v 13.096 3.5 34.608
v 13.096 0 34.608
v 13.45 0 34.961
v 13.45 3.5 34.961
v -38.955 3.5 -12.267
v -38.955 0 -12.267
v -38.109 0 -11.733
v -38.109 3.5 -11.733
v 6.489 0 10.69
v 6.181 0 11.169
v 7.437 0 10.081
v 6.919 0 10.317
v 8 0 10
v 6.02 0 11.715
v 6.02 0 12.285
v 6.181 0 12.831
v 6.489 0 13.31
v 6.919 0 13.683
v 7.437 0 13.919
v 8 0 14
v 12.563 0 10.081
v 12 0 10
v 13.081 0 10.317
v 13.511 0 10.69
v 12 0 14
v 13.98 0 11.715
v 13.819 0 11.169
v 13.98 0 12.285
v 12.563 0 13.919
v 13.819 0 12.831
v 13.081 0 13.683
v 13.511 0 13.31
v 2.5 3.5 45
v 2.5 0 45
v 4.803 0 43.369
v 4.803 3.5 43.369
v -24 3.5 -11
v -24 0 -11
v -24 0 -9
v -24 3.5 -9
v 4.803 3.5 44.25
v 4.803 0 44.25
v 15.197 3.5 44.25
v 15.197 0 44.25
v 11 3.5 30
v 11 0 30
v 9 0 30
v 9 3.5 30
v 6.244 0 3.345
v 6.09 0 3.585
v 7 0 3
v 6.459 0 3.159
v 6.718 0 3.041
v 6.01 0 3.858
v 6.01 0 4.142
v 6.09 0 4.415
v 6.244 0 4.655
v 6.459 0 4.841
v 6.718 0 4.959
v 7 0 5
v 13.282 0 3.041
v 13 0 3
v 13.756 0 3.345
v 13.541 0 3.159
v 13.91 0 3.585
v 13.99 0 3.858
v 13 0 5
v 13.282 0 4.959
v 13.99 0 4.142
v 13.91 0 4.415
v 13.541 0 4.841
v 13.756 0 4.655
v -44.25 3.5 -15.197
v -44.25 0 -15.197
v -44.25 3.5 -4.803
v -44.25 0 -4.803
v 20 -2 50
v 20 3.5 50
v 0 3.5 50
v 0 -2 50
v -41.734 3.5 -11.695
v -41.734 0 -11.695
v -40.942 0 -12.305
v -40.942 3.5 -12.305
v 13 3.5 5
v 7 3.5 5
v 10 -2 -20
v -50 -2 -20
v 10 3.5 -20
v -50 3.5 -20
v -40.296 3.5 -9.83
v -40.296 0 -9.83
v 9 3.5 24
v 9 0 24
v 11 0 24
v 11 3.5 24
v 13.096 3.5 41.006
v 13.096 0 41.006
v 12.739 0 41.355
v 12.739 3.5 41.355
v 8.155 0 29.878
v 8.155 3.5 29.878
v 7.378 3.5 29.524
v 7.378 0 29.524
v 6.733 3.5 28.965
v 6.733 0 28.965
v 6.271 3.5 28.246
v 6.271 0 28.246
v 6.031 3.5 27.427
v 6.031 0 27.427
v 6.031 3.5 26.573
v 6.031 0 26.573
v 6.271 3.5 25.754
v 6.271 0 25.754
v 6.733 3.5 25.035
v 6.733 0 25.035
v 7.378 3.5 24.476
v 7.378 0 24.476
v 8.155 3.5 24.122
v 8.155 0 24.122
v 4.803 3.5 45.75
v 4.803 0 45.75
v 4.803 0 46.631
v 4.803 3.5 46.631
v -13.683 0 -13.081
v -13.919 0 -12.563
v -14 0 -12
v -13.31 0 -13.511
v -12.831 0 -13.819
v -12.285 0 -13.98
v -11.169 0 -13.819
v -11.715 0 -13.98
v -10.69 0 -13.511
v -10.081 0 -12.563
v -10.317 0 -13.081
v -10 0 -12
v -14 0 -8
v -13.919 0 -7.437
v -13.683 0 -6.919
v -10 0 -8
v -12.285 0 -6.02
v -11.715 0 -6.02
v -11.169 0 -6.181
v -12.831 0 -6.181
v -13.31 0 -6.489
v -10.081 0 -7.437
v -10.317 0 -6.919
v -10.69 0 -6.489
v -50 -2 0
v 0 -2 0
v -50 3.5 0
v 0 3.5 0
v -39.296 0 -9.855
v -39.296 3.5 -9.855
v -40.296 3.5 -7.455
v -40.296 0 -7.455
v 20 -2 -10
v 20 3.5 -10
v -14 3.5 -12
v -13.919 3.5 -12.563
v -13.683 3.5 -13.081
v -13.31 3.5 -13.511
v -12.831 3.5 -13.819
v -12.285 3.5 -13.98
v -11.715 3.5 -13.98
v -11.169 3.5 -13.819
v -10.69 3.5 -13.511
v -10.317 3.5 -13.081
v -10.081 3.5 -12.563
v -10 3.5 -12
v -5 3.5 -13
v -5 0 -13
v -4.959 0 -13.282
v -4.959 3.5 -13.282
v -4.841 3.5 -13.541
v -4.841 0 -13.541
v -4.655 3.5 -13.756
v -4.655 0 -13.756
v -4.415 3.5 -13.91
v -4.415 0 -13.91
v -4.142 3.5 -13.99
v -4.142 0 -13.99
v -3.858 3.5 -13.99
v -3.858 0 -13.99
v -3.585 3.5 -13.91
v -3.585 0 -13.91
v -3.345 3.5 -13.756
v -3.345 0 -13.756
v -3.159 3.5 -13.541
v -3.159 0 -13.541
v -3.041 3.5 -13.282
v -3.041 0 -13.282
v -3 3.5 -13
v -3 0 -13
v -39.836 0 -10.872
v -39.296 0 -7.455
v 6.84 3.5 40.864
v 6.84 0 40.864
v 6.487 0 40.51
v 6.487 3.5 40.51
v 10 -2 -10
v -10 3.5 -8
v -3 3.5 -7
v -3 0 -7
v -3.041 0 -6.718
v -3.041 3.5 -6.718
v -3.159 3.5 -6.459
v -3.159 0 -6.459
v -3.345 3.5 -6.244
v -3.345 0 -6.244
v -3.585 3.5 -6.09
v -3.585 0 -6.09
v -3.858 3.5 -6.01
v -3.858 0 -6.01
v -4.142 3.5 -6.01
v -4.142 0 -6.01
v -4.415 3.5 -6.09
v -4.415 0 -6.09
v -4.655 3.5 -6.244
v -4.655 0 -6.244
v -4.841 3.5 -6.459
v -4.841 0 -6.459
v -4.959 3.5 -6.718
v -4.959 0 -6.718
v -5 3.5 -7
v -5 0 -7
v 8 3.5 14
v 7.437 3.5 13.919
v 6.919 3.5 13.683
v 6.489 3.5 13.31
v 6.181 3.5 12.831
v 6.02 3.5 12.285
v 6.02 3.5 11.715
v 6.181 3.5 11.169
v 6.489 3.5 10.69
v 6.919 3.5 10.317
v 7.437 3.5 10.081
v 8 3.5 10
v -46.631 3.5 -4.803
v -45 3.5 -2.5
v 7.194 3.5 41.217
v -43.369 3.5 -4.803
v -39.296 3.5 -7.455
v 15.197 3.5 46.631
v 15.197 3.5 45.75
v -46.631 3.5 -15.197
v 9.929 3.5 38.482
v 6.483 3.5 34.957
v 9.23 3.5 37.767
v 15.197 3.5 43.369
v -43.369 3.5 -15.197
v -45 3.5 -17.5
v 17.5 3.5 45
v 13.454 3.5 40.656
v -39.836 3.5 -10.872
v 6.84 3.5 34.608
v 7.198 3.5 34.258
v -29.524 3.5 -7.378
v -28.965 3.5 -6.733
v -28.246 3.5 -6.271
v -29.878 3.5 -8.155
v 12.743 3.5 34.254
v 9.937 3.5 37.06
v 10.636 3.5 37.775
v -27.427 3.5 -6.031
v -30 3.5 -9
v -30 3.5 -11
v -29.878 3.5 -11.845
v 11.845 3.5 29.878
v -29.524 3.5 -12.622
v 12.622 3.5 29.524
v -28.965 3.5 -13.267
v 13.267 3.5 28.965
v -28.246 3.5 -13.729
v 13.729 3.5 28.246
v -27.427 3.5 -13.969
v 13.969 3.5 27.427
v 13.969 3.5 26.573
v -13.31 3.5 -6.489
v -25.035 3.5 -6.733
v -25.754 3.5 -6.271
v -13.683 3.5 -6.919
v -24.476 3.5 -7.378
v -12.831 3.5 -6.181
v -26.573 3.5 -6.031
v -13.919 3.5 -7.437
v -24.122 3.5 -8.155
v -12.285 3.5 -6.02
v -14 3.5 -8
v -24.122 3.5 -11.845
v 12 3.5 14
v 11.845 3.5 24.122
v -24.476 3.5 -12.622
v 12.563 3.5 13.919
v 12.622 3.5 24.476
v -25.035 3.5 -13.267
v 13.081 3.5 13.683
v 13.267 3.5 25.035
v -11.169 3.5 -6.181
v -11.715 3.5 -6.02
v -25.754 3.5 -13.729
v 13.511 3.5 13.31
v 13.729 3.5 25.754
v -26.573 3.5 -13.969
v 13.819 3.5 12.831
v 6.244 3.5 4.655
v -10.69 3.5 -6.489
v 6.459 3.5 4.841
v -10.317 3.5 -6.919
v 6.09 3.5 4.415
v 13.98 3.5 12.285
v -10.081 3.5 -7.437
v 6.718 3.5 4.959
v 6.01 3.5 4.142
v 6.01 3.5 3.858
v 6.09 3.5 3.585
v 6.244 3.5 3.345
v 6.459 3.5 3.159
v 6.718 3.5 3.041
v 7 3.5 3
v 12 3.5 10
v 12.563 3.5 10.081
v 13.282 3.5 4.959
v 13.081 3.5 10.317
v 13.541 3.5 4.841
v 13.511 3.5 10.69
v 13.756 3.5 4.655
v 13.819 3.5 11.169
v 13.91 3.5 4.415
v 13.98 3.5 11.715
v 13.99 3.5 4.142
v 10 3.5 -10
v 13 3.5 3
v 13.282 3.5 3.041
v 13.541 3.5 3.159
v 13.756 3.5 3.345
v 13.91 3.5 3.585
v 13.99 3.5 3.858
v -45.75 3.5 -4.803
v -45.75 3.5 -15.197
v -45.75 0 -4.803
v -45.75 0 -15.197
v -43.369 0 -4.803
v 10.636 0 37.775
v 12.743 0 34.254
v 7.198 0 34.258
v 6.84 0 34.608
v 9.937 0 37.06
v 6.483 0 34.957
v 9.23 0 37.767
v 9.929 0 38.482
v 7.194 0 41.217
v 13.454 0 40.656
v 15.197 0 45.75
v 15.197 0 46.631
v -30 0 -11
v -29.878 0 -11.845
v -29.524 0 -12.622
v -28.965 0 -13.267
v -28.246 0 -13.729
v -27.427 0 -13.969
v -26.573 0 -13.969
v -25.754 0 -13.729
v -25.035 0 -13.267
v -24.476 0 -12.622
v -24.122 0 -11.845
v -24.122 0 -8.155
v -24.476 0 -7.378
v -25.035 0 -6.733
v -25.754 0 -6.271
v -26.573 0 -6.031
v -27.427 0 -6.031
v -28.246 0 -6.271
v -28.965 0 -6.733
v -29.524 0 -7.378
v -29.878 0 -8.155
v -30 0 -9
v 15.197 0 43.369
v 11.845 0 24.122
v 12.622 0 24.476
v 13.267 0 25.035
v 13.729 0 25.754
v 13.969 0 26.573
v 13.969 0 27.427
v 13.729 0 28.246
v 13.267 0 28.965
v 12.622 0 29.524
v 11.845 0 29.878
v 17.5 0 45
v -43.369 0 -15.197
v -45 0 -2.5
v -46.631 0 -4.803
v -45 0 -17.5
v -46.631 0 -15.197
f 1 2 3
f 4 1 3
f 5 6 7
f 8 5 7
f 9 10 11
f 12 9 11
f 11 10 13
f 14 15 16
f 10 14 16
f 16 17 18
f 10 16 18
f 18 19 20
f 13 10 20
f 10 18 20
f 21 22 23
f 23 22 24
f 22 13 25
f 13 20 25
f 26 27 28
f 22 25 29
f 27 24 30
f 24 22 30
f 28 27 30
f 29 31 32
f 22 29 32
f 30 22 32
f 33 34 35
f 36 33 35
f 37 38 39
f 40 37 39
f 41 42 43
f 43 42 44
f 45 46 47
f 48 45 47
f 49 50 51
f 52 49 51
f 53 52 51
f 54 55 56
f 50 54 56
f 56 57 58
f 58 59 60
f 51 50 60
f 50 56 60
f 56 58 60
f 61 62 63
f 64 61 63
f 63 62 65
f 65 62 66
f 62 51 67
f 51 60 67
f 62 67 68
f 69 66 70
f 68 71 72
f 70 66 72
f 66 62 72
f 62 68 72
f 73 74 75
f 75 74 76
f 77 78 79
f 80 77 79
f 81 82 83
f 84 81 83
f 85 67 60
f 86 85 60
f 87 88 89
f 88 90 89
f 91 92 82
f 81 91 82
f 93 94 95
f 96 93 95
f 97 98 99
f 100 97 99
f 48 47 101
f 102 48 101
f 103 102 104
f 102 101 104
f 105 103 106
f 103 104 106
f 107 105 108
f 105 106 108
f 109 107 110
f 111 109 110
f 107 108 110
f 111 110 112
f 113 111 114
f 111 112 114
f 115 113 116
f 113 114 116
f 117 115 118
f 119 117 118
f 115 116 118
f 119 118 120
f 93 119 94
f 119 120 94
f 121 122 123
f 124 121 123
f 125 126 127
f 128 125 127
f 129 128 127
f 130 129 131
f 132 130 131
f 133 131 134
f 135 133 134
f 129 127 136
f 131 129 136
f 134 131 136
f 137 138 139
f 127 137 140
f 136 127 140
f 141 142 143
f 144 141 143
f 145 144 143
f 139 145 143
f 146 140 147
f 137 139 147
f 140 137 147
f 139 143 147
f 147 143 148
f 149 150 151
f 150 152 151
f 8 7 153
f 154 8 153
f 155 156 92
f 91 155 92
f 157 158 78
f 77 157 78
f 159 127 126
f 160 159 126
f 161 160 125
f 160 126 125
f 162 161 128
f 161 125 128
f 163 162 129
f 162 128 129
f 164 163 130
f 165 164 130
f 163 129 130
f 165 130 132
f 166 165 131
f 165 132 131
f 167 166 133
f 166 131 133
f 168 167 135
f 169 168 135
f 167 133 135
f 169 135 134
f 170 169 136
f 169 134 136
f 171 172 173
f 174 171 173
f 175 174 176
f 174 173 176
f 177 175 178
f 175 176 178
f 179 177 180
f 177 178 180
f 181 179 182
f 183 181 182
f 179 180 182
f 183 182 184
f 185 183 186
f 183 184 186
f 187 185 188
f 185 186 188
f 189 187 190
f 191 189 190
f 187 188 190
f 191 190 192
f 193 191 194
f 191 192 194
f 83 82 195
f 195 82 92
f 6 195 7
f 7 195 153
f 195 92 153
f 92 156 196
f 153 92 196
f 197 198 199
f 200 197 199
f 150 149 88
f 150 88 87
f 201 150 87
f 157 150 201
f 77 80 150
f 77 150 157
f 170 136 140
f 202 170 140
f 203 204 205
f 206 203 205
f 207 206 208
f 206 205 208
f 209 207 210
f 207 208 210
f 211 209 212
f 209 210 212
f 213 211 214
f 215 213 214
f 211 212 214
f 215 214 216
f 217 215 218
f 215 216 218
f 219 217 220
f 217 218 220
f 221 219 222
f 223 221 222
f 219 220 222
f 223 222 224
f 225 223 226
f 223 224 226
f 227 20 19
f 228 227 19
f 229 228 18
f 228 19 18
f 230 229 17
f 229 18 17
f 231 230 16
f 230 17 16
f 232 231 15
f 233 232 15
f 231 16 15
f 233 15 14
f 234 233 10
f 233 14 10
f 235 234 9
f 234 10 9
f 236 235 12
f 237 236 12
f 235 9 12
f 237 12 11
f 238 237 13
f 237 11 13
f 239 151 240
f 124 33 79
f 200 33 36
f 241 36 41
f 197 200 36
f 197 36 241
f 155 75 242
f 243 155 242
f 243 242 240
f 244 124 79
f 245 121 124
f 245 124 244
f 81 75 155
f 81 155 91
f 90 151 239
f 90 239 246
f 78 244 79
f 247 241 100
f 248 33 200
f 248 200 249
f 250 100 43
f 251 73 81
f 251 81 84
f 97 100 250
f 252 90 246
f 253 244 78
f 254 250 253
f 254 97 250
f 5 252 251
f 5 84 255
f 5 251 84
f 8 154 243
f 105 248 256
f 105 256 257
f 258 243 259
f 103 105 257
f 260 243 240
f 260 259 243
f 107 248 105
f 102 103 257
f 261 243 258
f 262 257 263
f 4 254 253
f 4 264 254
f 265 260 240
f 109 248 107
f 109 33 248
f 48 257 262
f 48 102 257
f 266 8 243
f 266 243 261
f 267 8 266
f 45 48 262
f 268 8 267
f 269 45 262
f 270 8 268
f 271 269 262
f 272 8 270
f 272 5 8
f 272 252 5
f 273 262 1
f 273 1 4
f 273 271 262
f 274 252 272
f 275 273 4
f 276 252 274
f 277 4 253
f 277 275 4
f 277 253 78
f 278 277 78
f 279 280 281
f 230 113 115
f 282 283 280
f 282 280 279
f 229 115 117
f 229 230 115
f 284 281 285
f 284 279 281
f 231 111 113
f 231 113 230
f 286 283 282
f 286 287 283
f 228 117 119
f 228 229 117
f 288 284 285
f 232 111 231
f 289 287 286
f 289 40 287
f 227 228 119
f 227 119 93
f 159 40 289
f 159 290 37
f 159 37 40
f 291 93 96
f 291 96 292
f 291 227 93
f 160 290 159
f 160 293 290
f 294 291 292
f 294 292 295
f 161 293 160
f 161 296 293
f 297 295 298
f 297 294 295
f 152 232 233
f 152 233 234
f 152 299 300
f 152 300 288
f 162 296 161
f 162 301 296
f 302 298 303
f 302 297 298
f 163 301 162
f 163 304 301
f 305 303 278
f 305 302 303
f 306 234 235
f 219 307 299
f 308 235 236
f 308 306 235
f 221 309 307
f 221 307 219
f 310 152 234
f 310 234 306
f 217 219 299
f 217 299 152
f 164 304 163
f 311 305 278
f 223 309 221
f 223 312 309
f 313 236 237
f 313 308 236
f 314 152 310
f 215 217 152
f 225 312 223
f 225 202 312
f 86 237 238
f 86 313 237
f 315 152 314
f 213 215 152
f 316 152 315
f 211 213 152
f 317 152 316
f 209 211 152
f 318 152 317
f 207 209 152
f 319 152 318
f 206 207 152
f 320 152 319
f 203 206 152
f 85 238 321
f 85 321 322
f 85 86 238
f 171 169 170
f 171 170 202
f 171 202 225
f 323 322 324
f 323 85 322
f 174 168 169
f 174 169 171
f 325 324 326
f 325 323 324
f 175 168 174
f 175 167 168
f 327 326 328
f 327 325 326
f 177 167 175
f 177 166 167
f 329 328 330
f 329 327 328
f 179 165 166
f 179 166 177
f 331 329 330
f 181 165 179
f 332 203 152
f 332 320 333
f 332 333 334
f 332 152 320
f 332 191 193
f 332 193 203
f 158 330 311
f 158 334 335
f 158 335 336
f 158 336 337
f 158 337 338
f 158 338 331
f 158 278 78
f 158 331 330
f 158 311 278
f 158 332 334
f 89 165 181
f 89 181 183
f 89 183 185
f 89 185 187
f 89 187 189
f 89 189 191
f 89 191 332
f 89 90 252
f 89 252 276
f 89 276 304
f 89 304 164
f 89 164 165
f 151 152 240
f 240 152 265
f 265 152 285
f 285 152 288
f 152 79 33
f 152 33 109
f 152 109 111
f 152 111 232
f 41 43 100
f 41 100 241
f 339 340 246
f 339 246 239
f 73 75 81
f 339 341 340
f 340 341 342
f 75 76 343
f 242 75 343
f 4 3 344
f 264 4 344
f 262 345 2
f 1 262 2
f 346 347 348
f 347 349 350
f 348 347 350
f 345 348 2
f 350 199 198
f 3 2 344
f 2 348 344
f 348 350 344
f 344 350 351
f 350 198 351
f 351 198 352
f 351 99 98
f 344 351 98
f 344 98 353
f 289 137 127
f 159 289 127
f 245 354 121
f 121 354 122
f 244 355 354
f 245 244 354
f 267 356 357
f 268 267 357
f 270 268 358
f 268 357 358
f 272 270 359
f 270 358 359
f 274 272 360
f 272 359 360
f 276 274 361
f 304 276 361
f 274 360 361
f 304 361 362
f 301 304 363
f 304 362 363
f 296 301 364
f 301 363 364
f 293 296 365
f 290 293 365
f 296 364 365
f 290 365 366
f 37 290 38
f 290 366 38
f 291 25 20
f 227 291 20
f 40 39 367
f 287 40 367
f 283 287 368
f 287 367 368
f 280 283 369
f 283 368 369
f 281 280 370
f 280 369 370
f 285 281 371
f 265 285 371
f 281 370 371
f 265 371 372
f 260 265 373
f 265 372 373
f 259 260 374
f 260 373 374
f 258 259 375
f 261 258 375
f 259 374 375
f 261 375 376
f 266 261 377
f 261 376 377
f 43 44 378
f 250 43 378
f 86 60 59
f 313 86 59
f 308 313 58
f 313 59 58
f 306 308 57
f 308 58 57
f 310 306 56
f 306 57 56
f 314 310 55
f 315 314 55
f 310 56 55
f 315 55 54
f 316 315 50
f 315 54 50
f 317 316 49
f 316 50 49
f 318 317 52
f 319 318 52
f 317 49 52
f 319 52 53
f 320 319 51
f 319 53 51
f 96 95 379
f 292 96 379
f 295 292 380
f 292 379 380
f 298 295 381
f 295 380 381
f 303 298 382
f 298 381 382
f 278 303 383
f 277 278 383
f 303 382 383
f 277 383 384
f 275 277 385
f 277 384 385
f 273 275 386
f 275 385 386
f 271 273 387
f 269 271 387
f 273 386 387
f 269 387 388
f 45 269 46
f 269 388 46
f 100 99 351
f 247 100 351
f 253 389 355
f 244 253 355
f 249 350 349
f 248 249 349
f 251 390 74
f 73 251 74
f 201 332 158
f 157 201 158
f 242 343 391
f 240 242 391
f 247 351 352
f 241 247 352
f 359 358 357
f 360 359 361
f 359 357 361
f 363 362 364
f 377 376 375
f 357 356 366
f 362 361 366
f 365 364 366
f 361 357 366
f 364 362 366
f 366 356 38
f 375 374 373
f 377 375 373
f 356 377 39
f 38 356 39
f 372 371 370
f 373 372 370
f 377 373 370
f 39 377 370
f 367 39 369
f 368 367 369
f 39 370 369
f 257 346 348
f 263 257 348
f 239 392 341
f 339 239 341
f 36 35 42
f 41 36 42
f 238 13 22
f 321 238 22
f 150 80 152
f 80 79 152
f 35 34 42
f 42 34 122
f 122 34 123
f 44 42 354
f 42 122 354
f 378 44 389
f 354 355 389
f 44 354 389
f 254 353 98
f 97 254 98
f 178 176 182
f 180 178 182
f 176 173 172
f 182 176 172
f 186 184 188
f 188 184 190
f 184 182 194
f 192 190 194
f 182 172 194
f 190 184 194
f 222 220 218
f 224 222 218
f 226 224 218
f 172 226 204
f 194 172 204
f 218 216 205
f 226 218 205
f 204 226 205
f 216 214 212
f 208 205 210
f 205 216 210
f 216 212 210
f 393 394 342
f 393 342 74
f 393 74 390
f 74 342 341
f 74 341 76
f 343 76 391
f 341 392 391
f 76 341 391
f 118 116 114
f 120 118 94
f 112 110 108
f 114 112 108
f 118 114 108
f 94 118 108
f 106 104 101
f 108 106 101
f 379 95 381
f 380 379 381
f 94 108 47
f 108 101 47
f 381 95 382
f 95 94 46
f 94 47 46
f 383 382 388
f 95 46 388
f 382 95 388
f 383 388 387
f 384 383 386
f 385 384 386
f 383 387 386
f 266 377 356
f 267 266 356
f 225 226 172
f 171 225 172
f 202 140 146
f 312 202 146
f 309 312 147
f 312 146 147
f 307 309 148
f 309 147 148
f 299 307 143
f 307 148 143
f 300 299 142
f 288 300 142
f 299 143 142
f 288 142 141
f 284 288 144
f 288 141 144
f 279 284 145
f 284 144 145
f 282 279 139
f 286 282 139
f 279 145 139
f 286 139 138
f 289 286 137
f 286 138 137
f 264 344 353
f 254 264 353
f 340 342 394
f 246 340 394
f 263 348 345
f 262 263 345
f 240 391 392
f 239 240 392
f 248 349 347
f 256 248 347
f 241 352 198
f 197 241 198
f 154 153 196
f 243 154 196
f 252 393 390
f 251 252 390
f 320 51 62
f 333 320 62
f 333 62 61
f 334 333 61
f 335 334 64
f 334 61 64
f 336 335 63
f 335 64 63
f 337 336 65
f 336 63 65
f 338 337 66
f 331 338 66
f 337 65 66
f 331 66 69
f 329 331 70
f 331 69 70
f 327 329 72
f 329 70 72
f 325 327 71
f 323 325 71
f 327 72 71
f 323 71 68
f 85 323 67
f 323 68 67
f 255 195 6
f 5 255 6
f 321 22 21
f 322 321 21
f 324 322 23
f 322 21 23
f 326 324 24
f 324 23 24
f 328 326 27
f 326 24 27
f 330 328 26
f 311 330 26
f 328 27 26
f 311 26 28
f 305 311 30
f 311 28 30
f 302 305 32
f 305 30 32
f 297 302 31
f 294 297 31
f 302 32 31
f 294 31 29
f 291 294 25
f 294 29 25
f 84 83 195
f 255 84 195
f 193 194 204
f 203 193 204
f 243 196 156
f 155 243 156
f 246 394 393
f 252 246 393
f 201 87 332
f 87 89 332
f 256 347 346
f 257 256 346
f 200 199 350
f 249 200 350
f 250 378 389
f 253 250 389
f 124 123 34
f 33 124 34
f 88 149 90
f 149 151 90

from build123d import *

# Parameters (mm, degrees)
BOSS_EXTRUDE1_DEPTH = 3.5
BOSS_EXTRUDE3_DEPTH = 2


with BuildPart() as part:
    # Sketch1 → Boss-Extrude1 (new body)
    with BuildSketch(Plane(origin=(0, 0, 0), x_dir=(1, 0, 0), z_dir=(0, 1, 0))):
        Polygon((20, 10), (10, 10), (10, 20), (-50, 20), (-50, 0), (0, 0), (0, -50), (20, -50), align=None)
        Polygon((15.197176758, -43.369163918), (17.5, -45), (15.197176758, -46.630836082), (15.197176758, -45.75), (4.802823242, -45.75), (4.802823242, -46.630836082), (2.5, -45), (4.802823242, -43.369163918), (4.802823242, -44.25), (15.197176758, -44.25), align=None, mode=Mode.SUBTRACT)
        Polygon((7.193827961, -41.21727219), (6.840274571, -40.863718799), (6.48672118, -40.510165409), (9.229988375, -37.766898214), (6.482771236, -34.957244322), (6.840274571, -34.607685506), (7.197777905, -34.25812669), (9.93713979, -37.059746799), (12.742754474, -34.254132115), (13.096307864, -34.607685506), (13.449861255, -34.961238896), (10.636301551, -37.7747986), (13.453811199, -40.656342558), (13.096307864, -41.005901374), (12.73880453, -41.35546019), (9.929150136, -38.481950015), align=None, mode=Mode.SUBTRACT)
        with BuildLine():
            Line((9, -24), (11, -24))
            ThreePointArc((11, -24), (14, -27), (11, -30))
            Line((11, -30), (9, -30))
            ThreePointArc((9, -30), (6, -27), (9, -24))
        make_face(mode=Mode.SUBTRACT)
        Polygon((-43.369163918, 4.802823242), (-45, 2.5), (-46.630836082, 4.802823242), (-45.75, 4.802823242), (-45.75, 15.197176758), (-46.630836082, 15.197176758), (-45, 17.5), (-43.369163918, 15.197176758), (-44.25, 15.197176758), (-44.25, 4.802823242), align=None, mode=Mode.SUBTRACT)
        Polygon((-40.942094571, 12.305355363), (-39.836319425, 10.871595985), (-38.954723638, 12.267051774), (-38.10930457, 11.732948226), (-39.295537885, 9.85528936), (-39.295537885, 7.454795226), (-40.295537885, 7.454795226), (-40.295537885, 9.829586897), (-41.733948351, 11.694644637), align=None, mode=Mode.SUBTRACT)
        with BuildLine():
            ThreePointArc((-30, 11), (-27, 14), (-24, 11))
            Line((-24, 11), (-24, 9))
            ThreePointArc((-24, 9), (-27, 6), (-30, 9))
            Line((-30, 9), (-30, 11))
        make_face(mode=Mode.SUBTRACT)
        with BuildLine():
            Line((8, -10), (12, -10))
            ThreePointArc((12, -10), (14, -12), (12, -14))
            Line((12, -14), (8, -14))
            ThreePointArc((8, -14), (6, -12), (8, -10))
        make_face(mode=Mode.SUBTRACT)
        with BuildLine():
            Line((7, -3), (13, -3))
            ThreePointArc((13, -3), (14, -4), (13, -5))
            Line((13, -5), (7, -5))
            ThreePointArc((7, -5), (6, -4), (7, -3))
        make_face(mode=Mode.SUBTRACT)
        with BuildLine():
            ThreePointArc((-14, 12), (-12, 14), (-10, 12))
            Line((-10, 12), (-10, 8))
            ThreePointArc((-10, 8), (-12, 6), (-14, 8))
            Line((-14, 8), (-14, 12))
        make_face(mode=Mode.SUBTRACT)
        with BuildLine():
            ThreePointArc((-5, 13), (-4, 14), (-3, 13))
            Line((-3, 13), (-3, 7))
            ThreePointArc((-3, 7), (-4, 6), (-5, 7))
            Line((-5, 7), (-5, 13))
        make_face(mode=Mode.SUBTRACT)
    extrude(amount=BOSS_EXTRUDE1_DEPTH)

    # Sketch2 → Boss-Extrude3 (add)
    with BuildSketch(Plane.XZ):
        Polygon((20, 50), (0, 50), (0, 0), (-50, 0), (-50, -20), (10, -20), (10, -10), (20, -10), align=None)
    extrude(amount=BOSS_EXTRUDE3_DEPTH)


solid = part.part
